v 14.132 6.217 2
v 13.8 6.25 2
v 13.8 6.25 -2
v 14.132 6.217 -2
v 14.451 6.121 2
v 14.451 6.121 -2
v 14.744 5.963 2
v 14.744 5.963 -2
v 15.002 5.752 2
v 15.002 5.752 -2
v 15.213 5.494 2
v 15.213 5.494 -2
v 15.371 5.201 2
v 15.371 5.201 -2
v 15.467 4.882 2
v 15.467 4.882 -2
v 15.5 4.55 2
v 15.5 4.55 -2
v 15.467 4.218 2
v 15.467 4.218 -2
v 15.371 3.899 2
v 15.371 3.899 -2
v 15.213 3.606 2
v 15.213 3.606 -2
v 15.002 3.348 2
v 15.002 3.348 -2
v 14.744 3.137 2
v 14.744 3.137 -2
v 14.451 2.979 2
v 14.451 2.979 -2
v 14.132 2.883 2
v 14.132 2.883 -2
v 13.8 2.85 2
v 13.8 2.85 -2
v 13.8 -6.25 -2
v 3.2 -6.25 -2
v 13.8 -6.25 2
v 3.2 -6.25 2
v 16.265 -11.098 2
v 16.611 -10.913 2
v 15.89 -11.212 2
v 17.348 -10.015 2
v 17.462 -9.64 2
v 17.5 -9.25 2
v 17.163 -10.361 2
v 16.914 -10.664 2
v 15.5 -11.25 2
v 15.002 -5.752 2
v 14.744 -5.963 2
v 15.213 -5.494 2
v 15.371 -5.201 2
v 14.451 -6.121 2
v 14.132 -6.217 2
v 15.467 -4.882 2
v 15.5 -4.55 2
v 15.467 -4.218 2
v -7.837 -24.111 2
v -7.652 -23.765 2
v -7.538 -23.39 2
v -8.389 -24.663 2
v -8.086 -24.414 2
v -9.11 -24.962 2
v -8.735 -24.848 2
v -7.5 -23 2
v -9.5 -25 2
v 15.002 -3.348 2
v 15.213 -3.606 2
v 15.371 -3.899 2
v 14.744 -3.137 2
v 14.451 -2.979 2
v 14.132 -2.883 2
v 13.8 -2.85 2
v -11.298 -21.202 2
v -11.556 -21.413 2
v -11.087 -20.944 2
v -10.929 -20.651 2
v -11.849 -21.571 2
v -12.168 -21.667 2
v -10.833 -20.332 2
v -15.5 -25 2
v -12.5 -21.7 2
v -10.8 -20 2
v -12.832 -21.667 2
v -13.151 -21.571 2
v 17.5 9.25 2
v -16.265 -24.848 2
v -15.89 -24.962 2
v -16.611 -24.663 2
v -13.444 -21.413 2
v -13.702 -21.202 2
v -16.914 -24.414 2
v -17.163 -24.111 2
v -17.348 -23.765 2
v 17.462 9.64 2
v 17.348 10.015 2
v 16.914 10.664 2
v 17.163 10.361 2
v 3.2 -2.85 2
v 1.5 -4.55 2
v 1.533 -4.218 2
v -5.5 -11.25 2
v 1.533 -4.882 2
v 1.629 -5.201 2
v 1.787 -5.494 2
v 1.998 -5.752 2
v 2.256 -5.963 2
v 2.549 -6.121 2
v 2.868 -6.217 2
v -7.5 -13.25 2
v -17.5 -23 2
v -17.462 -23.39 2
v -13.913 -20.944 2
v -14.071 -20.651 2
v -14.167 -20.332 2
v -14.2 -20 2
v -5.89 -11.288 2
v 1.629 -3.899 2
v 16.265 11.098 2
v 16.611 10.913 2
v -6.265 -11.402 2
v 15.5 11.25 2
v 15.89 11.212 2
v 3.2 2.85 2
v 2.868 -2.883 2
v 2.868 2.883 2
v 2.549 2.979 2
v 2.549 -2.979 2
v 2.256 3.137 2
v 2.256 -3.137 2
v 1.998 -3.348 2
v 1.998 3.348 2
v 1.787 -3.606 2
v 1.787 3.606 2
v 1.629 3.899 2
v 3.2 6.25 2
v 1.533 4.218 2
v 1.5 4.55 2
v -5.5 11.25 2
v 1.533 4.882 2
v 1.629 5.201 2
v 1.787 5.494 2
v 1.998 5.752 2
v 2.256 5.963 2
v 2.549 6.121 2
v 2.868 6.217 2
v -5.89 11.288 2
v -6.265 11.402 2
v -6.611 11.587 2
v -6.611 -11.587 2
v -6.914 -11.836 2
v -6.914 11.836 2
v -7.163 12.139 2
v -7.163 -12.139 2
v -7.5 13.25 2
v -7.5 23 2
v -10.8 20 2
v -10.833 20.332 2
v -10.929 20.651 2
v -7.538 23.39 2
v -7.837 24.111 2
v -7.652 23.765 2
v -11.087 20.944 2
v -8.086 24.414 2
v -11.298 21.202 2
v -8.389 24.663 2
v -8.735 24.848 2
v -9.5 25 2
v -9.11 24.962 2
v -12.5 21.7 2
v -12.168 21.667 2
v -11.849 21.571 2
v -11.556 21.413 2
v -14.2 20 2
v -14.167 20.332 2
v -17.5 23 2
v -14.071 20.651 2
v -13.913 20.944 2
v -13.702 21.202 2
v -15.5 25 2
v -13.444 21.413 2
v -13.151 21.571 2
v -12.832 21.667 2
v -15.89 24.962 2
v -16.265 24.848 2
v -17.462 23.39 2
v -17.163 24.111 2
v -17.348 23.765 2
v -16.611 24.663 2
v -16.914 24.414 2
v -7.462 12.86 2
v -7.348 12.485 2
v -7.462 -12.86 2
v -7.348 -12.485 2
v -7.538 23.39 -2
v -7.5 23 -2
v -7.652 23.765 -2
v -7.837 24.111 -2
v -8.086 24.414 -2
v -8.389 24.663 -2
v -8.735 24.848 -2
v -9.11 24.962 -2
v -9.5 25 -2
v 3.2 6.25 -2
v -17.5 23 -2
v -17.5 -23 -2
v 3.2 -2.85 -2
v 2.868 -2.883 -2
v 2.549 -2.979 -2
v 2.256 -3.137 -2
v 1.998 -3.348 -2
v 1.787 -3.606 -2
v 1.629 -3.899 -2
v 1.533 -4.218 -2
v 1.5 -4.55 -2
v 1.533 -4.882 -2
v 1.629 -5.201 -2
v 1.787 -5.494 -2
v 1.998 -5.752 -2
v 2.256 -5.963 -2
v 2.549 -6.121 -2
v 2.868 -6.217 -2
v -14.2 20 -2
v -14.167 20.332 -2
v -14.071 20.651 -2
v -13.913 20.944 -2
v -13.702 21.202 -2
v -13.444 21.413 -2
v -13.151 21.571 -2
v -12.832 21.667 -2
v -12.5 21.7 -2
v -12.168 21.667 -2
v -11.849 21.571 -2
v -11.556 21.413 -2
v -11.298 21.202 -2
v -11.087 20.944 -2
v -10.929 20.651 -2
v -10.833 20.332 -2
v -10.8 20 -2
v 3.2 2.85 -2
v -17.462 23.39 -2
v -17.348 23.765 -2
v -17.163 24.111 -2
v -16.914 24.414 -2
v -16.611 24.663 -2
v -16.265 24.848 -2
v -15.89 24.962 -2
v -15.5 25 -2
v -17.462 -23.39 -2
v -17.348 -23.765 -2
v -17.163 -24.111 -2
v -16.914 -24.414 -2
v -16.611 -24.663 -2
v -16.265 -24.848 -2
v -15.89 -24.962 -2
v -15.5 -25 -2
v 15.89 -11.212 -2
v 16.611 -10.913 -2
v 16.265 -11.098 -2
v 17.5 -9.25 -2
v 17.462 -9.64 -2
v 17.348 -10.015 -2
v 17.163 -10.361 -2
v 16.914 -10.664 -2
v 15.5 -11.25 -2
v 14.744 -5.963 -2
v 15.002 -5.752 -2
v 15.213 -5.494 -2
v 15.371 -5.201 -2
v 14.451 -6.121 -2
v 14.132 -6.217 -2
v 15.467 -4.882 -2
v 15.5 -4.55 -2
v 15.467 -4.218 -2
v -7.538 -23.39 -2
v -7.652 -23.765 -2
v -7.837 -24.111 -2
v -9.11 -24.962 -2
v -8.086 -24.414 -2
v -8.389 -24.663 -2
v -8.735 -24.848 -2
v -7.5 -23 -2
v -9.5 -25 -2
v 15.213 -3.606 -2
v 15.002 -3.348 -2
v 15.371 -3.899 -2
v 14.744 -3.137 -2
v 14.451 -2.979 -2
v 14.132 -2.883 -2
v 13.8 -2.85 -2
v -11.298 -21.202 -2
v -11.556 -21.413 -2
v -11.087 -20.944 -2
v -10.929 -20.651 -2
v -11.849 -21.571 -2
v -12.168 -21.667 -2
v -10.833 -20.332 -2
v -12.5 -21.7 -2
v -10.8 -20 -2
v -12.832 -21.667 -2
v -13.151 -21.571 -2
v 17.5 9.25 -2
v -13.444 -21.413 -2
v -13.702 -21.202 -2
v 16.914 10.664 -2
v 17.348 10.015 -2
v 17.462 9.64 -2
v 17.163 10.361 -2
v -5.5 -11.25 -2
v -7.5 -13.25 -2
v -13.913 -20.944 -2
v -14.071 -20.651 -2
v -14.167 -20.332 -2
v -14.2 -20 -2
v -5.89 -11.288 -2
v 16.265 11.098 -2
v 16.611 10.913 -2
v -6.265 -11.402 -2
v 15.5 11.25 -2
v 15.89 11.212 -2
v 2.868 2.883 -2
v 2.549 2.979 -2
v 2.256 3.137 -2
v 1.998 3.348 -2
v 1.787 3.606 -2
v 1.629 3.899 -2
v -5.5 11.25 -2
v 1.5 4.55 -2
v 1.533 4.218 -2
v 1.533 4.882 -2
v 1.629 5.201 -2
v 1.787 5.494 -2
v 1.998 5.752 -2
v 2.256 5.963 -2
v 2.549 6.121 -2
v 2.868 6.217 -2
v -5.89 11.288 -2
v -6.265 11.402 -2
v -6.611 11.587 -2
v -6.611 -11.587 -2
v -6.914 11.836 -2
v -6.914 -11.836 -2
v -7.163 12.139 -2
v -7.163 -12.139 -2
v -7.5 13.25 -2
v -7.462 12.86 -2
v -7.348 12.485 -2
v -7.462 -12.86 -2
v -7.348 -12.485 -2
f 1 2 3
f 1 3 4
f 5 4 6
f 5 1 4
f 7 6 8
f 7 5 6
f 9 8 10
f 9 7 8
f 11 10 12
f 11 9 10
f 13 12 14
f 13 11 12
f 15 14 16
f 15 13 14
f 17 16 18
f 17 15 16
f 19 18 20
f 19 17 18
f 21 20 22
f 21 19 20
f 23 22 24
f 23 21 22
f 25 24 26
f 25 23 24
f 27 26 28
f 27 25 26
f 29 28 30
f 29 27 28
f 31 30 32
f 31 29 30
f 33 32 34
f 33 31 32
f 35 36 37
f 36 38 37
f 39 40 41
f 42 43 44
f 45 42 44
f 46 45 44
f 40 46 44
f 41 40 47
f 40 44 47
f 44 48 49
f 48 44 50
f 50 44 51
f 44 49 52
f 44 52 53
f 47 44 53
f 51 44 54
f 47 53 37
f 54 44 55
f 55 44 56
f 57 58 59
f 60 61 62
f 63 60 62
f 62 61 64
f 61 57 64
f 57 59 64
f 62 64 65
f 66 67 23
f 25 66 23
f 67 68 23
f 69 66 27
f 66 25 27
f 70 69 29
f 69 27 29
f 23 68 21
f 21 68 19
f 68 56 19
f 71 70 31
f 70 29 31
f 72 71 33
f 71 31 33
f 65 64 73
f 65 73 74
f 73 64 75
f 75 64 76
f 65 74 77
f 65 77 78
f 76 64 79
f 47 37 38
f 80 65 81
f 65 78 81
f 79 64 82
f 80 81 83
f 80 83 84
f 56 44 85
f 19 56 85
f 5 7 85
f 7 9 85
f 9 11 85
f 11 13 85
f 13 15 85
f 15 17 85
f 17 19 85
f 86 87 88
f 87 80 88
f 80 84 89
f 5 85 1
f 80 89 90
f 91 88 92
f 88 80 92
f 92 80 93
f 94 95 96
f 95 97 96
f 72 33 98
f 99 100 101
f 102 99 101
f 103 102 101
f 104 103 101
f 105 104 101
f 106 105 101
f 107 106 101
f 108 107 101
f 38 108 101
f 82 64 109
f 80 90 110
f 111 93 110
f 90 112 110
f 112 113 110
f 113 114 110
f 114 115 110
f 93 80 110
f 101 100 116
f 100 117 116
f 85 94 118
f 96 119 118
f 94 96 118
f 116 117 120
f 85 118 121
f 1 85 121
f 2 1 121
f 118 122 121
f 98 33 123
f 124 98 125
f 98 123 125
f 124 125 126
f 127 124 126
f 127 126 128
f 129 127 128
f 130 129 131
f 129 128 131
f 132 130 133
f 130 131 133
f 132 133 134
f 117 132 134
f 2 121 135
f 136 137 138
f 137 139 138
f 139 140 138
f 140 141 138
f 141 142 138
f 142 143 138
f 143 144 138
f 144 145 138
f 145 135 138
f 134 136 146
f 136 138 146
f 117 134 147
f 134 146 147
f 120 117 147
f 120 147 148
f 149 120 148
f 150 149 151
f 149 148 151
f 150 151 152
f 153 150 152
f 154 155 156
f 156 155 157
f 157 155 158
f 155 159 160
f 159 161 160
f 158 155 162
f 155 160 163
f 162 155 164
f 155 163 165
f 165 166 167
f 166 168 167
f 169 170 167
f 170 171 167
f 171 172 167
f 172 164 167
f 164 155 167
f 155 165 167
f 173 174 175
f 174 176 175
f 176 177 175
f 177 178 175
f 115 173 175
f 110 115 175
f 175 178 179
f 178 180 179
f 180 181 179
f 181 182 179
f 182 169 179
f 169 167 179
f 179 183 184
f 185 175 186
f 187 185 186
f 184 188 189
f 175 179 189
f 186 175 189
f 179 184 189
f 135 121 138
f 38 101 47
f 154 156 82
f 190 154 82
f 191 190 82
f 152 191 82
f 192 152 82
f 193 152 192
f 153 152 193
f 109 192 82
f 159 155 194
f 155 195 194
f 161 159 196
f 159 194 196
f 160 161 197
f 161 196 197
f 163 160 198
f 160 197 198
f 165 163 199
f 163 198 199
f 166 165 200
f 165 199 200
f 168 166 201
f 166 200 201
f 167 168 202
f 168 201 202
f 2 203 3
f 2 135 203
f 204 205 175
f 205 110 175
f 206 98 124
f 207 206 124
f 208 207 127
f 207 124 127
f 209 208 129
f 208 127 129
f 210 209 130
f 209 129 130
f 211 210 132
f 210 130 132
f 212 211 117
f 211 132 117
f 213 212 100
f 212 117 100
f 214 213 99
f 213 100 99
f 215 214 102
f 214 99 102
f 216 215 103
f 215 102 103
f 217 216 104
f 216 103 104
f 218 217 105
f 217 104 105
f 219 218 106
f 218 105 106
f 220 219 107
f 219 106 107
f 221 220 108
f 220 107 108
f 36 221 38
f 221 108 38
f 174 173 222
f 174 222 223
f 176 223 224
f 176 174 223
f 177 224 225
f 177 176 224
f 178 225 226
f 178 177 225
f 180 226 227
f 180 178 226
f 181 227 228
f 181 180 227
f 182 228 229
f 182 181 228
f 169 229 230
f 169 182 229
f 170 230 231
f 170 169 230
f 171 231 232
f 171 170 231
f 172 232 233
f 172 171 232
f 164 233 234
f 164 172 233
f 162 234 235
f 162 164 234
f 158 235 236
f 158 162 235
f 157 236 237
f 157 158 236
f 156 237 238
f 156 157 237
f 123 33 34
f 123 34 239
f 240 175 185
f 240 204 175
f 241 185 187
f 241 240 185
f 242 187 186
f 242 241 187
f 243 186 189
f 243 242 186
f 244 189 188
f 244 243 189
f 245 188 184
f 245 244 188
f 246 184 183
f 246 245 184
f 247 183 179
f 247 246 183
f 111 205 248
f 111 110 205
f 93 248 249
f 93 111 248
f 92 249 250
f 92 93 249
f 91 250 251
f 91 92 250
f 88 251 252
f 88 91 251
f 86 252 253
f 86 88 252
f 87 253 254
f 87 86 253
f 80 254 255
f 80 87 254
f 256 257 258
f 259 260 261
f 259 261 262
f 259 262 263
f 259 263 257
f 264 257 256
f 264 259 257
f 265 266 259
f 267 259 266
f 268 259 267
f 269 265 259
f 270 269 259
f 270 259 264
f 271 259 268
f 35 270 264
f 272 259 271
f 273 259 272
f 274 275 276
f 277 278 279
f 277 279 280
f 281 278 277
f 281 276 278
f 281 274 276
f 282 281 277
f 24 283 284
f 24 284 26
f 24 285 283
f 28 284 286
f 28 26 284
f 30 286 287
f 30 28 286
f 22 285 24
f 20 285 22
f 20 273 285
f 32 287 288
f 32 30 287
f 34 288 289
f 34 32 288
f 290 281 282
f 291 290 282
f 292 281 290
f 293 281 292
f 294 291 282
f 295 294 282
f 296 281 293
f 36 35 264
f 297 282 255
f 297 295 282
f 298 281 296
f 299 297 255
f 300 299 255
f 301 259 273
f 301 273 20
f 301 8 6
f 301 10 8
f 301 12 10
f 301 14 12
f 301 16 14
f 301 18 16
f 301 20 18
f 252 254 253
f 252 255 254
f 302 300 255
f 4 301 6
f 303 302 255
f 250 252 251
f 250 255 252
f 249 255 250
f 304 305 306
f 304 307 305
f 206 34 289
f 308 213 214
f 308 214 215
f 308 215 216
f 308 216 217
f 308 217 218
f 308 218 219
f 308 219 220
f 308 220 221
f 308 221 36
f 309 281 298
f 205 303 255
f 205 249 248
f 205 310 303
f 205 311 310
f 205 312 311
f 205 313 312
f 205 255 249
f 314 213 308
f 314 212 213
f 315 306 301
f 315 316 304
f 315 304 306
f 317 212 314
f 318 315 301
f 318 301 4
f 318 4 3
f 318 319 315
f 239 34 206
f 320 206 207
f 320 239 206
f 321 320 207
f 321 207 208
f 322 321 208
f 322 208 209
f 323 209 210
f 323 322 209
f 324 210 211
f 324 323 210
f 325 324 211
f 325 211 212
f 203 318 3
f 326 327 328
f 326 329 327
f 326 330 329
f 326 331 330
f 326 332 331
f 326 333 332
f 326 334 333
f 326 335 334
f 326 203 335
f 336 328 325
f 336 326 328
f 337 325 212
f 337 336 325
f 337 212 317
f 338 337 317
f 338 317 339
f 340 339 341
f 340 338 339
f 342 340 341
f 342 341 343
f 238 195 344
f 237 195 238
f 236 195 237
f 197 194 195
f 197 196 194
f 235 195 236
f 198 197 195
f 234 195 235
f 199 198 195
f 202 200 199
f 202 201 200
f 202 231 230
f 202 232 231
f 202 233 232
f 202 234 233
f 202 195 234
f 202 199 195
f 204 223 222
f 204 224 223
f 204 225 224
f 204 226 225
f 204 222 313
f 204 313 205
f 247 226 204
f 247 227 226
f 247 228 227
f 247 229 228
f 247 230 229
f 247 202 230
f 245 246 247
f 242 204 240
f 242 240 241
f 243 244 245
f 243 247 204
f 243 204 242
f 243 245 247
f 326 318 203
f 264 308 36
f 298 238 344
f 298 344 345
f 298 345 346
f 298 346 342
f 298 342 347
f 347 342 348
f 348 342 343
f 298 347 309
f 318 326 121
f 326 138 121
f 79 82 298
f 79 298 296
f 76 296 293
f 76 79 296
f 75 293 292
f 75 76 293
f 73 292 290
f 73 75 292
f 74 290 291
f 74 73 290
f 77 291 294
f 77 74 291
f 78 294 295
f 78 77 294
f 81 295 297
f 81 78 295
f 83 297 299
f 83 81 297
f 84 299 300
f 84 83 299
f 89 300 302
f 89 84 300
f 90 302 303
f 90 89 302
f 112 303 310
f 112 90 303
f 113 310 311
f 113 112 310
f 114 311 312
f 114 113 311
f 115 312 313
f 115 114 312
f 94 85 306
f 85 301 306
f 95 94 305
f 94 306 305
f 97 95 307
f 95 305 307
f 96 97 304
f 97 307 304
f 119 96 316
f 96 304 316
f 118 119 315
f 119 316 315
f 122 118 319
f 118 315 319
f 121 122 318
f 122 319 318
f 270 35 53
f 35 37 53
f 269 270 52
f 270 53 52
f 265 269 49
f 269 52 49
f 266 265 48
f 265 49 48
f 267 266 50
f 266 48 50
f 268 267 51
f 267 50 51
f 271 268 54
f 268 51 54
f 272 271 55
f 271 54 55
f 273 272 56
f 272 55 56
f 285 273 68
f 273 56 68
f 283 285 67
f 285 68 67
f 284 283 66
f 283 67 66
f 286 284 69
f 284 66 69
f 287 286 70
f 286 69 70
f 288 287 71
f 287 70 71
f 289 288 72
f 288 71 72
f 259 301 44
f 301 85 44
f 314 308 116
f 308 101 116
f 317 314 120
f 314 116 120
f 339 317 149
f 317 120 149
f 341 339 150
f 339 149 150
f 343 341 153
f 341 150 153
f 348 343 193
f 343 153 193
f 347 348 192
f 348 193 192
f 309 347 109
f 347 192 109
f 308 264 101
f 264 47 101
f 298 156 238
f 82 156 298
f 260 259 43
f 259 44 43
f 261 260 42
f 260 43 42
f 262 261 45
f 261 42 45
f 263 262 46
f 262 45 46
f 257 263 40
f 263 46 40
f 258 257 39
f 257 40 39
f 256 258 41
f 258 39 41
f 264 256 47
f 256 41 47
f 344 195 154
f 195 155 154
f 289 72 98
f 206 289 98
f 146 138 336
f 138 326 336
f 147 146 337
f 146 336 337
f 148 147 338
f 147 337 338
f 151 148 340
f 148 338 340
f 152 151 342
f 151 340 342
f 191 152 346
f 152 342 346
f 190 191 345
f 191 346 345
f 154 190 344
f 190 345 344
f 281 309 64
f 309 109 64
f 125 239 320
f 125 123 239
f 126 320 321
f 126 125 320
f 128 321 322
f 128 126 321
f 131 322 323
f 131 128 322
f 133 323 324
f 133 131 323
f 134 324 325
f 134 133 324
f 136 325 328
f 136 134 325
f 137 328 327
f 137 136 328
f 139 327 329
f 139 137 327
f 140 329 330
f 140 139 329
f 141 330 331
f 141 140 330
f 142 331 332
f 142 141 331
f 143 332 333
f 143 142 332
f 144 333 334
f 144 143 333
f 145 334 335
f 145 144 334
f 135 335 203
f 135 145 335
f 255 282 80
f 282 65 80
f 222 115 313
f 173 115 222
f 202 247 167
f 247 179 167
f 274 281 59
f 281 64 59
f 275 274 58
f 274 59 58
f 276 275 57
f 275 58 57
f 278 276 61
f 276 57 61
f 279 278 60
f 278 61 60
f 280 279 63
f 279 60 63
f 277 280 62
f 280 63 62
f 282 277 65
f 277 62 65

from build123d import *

# Parameters (mm, degrees)
BOSS_EXTRU_1_DEPTH = 2
CONG_1_R           = 2


with BuildPart() as part:
    # Esquisse1 → Boss.-Extru.1 (new body, symmetric)
    with BuildSketch(Plane.XY):
        Polygon((-17.5, -25), (-17.5, 25), (-7.5, 25), (-7.5, 11.25), (17.5, 11.25), (17.5, -11.25), (-7.5, -11.25), (-7.5, -25), align=None)
        with BuildLine():
            Line((3.2, 6.25), (13.8, 6.25))
            ThreePointArc((13.8, 6.25), (15.5, 4.55), (13.8, 2.85))
            Line((13.8, 2.85), (3.2, 2.85))
            ThreePointArc((3.2, 2.85), (1.5, 4.55), (3.2, 6.25))
        make_face(mode=Mode.SUBTRACT)
        with BuildLine():
            Line((3.2, -6.25), (13.8, -6.25))
            ThreePointArc((13.8, -6.25), (15.5, -4.55), (13.8, -2.85))
            Line((13.8, -2.85), (3.2, -2.85))
            ThreePointArc((3.2, -2.85), (1.5, -4.55), (3.2, -6.25))
        make_face(mode=Mode.SUBTRACT)
        with BuildLine():
            Line((-10.8, 20), (-10.8, -20))
            ThreePointArc((-10.8, -20), (-12.5, -21.7), (-14.2, -20))
            Line((-14.2, -20), (-14.2, 20))
            ThreePointArc((-14.2, 20), (-12.5, 21.7), (-10.8, 20))
        make_face(mode=Mode.SUBTRACT)
    extrude(amount=BOSS_EXTRU_1_DEPTH, both=True)

    # Congé1
    cong_1_edges = [part.edges().sort_by_distance(p)[0] for p in [
        (-17.5, -25, 0),
        (-17.5, 25, 0),
        (-7.5, 25, 0),
        (-7.5, 11.25, 0),
        (17.5, 11.25, 0),
        (17.5, -11.25, 0),
        (-7.5, -11.25, 0),
        (-7.5, -25, 0),
    ]]
    fillet(cong_1_edges, radius=CONG_1_R)


solid = part.part
